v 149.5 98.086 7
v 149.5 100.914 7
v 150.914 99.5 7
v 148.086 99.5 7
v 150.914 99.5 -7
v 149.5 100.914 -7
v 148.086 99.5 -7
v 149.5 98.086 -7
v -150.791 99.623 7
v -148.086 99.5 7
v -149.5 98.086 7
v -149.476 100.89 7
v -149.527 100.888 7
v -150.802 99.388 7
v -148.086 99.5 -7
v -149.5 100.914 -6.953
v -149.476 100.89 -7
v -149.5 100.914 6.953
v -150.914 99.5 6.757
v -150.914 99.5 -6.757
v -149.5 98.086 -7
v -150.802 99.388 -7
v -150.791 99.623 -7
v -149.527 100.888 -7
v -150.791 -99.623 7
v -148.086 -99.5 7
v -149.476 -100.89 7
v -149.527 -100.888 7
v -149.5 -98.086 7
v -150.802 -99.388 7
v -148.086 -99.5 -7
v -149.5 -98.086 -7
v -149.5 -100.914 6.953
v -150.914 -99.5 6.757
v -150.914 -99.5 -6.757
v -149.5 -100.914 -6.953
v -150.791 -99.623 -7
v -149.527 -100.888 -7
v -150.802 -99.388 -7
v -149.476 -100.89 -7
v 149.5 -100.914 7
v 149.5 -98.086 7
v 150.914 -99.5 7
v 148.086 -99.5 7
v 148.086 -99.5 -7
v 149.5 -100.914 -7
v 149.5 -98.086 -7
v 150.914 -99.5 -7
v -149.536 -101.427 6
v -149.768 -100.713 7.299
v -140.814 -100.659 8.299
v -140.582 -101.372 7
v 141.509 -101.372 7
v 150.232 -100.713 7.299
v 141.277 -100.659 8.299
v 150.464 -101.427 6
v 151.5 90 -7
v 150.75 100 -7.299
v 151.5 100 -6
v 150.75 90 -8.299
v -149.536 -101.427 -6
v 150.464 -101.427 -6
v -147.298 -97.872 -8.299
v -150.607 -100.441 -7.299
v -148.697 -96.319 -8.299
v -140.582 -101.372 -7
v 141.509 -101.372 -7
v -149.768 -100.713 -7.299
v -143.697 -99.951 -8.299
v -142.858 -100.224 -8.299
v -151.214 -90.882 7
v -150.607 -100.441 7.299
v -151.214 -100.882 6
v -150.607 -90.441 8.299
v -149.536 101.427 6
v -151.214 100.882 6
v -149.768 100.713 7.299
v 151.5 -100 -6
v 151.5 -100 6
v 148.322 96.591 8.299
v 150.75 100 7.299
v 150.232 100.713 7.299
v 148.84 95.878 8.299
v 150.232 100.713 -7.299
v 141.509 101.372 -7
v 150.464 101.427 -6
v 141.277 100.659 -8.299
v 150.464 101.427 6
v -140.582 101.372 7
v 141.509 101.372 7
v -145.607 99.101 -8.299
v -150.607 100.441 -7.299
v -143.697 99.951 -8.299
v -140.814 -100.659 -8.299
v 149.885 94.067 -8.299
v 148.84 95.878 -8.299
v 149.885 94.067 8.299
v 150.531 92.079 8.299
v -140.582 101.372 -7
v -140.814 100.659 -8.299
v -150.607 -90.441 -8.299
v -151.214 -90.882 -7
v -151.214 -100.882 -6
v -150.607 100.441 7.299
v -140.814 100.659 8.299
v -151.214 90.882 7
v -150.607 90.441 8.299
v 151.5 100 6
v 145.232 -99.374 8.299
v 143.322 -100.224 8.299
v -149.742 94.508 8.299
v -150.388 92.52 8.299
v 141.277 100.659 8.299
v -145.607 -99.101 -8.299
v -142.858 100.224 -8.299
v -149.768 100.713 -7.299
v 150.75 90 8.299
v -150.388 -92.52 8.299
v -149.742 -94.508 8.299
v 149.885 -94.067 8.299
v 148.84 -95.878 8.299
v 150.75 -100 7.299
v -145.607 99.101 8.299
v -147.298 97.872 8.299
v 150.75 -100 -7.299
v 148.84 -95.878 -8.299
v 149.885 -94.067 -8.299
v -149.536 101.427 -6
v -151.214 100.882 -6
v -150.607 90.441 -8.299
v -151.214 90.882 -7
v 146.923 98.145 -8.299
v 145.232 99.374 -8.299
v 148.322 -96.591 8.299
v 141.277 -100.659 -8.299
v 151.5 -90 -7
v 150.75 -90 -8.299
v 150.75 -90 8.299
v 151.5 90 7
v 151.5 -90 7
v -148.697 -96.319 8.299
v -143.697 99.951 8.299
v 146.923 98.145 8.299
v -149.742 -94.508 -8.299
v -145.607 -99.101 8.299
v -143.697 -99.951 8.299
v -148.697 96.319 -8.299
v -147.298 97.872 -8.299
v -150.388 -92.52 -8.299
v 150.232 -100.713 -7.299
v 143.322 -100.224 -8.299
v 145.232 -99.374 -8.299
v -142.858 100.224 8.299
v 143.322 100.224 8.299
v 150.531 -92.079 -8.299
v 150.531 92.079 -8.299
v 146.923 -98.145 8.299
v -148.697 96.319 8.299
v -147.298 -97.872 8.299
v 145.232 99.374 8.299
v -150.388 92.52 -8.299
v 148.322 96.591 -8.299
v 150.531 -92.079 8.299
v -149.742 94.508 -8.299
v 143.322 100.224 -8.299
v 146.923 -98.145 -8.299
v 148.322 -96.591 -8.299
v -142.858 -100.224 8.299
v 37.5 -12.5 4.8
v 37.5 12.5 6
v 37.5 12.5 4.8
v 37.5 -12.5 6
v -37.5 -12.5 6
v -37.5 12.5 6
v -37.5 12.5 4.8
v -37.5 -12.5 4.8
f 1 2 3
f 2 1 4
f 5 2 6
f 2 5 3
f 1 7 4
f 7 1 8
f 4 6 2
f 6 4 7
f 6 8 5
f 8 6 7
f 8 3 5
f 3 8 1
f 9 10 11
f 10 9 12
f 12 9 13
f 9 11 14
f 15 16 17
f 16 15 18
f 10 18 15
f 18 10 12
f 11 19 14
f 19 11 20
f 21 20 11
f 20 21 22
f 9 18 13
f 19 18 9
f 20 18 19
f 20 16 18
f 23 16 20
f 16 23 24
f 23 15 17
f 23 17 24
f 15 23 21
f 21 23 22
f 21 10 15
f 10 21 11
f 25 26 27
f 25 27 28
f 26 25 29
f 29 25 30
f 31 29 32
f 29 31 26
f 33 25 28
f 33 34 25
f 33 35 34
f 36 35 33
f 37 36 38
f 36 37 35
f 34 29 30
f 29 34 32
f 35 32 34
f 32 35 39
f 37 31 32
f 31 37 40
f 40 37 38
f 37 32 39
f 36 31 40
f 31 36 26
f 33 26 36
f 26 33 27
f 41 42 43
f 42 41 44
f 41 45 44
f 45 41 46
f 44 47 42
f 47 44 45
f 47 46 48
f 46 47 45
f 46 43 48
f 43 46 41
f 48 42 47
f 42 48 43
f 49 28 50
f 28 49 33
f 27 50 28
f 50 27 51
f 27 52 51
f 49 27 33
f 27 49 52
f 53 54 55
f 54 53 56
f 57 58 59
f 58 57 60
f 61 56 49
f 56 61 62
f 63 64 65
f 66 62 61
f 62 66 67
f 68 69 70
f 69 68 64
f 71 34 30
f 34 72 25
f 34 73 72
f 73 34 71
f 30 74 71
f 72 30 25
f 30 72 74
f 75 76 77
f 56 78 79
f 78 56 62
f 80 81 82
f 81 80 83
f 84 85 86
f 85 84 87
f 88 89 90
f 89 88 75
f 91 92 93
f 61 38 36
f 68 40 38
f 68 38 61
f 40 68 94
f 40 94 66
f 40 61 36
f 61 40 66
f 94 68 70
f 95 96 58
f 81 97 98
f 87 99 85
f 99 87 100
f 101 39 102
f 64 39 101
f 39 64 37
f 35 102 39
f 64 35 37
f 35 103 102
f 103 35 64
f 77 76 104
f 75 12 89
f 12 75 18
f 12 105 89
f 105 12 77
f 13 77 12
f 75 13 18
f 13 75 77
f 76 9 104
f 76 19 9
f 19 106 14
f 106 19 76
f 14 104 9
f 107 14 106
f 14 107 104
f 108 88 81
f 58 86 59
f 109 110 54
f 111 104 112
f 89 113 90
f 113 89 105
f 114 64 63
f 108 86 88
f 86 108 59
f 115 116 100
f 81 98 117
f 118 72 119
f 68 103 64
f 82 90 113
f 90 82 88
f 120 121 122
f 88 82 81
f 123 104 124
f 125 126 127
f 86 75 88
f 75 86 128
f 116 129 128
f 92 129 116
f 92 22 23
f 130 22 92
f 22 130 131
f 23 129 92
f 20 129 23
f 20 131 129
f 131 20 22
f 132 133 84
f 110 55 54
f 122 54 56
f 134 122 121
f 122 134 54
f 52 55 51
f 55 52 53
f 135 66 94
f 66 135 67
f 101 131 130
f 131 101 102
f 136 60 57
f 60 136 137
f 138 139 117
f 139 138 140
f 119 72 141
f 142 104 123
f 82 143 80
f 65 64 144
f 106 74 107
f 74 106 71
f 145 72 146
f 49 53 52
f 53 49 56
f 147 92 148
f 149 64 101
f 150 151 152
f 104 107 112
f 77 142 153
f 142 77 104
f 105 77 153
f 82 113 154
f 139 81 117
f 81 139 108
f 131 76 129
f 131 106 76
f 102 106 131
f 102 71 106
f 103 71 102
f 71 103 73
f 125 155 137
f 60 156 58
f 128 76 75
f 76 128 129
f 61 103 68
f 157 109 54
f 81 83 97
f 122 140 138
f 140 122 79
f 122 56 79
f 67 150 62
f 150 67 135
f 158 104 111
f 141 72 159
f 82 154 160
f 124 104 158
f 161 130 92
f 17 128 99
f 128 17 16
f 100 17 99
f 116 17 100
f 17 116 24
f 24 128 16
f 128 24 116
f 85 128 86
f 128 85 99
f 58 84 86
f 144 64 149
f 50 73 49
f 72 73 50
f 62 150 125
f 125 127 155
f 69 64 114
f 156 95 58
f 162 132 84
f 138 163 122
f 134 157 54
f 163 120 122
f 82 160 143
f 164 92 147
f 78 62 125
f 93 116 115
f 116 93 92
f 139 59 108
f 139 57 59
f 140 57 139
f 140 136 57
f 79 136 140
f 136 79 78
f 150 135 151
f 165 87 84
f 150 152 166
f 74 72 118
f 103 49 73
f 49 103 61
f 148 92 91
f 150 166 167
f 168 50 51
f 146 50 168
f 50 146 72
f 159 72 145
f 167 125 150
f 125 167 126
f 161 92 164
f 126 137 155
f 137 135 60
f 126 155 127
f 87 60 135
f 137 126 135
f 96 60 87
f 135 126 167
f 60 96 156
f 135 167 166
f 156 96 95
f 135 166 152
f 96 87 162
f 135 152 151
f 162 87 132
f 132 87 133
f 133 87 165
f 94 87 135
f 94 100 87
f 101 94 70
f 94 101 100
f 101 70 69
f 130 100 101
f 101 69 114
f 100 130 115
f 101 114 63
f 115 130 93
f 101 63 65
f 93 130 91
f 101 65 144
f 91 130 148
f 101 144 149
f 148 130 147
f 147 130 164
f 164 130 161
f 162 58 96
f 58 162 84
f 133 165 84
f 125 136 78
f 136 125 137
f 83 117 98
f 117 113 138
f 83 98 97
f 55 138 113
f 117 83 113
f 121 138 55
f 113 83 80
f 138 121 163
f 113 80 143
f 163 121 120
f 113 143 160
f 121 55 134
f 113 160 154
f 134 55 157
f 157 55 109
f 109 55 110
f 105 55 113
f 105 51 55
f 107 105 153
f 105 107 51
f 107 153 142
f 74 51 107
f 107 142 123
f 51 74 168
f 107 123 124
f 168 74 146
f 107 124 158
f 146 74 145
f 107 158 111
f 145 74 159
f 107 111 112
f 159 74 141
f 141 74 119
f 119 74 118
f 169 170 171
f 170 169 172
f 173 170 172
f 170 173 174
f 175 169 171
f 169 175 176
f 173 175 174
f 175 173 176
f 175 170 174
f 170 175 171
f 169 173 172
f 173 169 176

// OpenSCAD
// Parameters
plate_length = 300; //[150:600:1]
plate_width = 200; //[100:400:1]
plate_thickness = 12; //[6:24:1]
corner_radius = 10; //[5:20:1]
edge_fillet_radius = 1.5; //[0.5:3:0.1]
chamfer_size = 2; //[0.5:6:0.5]
op_overlap = 1; //[0.5:2:0.5]

// Main tooling plate with rounded corners
module tooling_plate() {
  color("Silver")
  hull() {
    translate([0, 0, 0])
      cube([plate_length, plate_width, plate_thickness], center=true);
    translate([plate_length/2 - corner_radius, plate_width/2 - corner_radius, 0])
      cylinder(h=plate_thickness + 2*op_overlap, r=corner_radius, center=true);
    translate([-plate_length/2 + corner_radius, plate_width/2 - corner_radius, 0])
      cylinder(h=plate_thickness + 2*op_overlap, r=corner_radius, center=true);
    translate([-plate_length/2 + corner_radius, -plate_width/2 + corner_radius, 0])
      cylinder(h=plate_thickness + 2*op_overlap, r=corner_radius, center=true);
    translate([plate_length/2 - corner_radius, -plate_width/2 + corner_radius, 0])
      cylinder(h=plate_thickness + 2*op_overlap, r=corner_radius, center=true);
  }
}

// Edge fillet approximation
module edge_fillet() {
  minkowski() {
    tooling_plate();
    sphere(r=edge_fillet_radius, center=true);
  }
}

// Corner chamfers
module corner_chamfers() {
  union() {
    translate([plate_length/2 - chamfer_size/2 + op_overlap/2, plate_width/2 - chamfer_size/2 + op_overlap/2, 0])
      rotate([0, 0, 45])
      cube([chamfer_size, chamfer_size, plate_thickness + 2*op_overlap], center=true);
    translate([-plate_length/2 + chamfer_size/2 - op_overlap/2, plate_width/2 - chamfer_size/2 + op_overlap/2, 0])
      rotate([0, 0, 45])
      cube([chamfer_size, chamfer_size, plate_thickness + 2*op_overlap], center=true);
    translate([-plate_length/2 + chamfer_size/2 - op_overlap/2, -plate_width/2 + chamfer_size/2 - op_overlap/2, 0])
      rotate([0, 0, 45])
      cube([chamfer_size, chamfer_size, plate_thickness + 2*op_overlap], center=true);
    translate([plate_length/2 - chamfer_size/2 + op_overlap/2, -plate_width/2 + chamfer_size/2 - op_overlap/2, 0])
      rotate([0, 0, 45])
      cube([chamfer_size, chamfer_size, plate_thickness + 2*op_overlap], center=true);
  }
}

// Engraved label placeholder (omitted per no-text rule)
module engraved_label() {
  translate([0, 0, plate_thickness/2 - (plate_thickness/10)/2])
    cube([plate_length/4, plate_width/8, plate_thickness/10], center=true);
}

// Complete model
difference() {
  edge_fillet();
  corner_chamfers();
  engraved_label();
}
